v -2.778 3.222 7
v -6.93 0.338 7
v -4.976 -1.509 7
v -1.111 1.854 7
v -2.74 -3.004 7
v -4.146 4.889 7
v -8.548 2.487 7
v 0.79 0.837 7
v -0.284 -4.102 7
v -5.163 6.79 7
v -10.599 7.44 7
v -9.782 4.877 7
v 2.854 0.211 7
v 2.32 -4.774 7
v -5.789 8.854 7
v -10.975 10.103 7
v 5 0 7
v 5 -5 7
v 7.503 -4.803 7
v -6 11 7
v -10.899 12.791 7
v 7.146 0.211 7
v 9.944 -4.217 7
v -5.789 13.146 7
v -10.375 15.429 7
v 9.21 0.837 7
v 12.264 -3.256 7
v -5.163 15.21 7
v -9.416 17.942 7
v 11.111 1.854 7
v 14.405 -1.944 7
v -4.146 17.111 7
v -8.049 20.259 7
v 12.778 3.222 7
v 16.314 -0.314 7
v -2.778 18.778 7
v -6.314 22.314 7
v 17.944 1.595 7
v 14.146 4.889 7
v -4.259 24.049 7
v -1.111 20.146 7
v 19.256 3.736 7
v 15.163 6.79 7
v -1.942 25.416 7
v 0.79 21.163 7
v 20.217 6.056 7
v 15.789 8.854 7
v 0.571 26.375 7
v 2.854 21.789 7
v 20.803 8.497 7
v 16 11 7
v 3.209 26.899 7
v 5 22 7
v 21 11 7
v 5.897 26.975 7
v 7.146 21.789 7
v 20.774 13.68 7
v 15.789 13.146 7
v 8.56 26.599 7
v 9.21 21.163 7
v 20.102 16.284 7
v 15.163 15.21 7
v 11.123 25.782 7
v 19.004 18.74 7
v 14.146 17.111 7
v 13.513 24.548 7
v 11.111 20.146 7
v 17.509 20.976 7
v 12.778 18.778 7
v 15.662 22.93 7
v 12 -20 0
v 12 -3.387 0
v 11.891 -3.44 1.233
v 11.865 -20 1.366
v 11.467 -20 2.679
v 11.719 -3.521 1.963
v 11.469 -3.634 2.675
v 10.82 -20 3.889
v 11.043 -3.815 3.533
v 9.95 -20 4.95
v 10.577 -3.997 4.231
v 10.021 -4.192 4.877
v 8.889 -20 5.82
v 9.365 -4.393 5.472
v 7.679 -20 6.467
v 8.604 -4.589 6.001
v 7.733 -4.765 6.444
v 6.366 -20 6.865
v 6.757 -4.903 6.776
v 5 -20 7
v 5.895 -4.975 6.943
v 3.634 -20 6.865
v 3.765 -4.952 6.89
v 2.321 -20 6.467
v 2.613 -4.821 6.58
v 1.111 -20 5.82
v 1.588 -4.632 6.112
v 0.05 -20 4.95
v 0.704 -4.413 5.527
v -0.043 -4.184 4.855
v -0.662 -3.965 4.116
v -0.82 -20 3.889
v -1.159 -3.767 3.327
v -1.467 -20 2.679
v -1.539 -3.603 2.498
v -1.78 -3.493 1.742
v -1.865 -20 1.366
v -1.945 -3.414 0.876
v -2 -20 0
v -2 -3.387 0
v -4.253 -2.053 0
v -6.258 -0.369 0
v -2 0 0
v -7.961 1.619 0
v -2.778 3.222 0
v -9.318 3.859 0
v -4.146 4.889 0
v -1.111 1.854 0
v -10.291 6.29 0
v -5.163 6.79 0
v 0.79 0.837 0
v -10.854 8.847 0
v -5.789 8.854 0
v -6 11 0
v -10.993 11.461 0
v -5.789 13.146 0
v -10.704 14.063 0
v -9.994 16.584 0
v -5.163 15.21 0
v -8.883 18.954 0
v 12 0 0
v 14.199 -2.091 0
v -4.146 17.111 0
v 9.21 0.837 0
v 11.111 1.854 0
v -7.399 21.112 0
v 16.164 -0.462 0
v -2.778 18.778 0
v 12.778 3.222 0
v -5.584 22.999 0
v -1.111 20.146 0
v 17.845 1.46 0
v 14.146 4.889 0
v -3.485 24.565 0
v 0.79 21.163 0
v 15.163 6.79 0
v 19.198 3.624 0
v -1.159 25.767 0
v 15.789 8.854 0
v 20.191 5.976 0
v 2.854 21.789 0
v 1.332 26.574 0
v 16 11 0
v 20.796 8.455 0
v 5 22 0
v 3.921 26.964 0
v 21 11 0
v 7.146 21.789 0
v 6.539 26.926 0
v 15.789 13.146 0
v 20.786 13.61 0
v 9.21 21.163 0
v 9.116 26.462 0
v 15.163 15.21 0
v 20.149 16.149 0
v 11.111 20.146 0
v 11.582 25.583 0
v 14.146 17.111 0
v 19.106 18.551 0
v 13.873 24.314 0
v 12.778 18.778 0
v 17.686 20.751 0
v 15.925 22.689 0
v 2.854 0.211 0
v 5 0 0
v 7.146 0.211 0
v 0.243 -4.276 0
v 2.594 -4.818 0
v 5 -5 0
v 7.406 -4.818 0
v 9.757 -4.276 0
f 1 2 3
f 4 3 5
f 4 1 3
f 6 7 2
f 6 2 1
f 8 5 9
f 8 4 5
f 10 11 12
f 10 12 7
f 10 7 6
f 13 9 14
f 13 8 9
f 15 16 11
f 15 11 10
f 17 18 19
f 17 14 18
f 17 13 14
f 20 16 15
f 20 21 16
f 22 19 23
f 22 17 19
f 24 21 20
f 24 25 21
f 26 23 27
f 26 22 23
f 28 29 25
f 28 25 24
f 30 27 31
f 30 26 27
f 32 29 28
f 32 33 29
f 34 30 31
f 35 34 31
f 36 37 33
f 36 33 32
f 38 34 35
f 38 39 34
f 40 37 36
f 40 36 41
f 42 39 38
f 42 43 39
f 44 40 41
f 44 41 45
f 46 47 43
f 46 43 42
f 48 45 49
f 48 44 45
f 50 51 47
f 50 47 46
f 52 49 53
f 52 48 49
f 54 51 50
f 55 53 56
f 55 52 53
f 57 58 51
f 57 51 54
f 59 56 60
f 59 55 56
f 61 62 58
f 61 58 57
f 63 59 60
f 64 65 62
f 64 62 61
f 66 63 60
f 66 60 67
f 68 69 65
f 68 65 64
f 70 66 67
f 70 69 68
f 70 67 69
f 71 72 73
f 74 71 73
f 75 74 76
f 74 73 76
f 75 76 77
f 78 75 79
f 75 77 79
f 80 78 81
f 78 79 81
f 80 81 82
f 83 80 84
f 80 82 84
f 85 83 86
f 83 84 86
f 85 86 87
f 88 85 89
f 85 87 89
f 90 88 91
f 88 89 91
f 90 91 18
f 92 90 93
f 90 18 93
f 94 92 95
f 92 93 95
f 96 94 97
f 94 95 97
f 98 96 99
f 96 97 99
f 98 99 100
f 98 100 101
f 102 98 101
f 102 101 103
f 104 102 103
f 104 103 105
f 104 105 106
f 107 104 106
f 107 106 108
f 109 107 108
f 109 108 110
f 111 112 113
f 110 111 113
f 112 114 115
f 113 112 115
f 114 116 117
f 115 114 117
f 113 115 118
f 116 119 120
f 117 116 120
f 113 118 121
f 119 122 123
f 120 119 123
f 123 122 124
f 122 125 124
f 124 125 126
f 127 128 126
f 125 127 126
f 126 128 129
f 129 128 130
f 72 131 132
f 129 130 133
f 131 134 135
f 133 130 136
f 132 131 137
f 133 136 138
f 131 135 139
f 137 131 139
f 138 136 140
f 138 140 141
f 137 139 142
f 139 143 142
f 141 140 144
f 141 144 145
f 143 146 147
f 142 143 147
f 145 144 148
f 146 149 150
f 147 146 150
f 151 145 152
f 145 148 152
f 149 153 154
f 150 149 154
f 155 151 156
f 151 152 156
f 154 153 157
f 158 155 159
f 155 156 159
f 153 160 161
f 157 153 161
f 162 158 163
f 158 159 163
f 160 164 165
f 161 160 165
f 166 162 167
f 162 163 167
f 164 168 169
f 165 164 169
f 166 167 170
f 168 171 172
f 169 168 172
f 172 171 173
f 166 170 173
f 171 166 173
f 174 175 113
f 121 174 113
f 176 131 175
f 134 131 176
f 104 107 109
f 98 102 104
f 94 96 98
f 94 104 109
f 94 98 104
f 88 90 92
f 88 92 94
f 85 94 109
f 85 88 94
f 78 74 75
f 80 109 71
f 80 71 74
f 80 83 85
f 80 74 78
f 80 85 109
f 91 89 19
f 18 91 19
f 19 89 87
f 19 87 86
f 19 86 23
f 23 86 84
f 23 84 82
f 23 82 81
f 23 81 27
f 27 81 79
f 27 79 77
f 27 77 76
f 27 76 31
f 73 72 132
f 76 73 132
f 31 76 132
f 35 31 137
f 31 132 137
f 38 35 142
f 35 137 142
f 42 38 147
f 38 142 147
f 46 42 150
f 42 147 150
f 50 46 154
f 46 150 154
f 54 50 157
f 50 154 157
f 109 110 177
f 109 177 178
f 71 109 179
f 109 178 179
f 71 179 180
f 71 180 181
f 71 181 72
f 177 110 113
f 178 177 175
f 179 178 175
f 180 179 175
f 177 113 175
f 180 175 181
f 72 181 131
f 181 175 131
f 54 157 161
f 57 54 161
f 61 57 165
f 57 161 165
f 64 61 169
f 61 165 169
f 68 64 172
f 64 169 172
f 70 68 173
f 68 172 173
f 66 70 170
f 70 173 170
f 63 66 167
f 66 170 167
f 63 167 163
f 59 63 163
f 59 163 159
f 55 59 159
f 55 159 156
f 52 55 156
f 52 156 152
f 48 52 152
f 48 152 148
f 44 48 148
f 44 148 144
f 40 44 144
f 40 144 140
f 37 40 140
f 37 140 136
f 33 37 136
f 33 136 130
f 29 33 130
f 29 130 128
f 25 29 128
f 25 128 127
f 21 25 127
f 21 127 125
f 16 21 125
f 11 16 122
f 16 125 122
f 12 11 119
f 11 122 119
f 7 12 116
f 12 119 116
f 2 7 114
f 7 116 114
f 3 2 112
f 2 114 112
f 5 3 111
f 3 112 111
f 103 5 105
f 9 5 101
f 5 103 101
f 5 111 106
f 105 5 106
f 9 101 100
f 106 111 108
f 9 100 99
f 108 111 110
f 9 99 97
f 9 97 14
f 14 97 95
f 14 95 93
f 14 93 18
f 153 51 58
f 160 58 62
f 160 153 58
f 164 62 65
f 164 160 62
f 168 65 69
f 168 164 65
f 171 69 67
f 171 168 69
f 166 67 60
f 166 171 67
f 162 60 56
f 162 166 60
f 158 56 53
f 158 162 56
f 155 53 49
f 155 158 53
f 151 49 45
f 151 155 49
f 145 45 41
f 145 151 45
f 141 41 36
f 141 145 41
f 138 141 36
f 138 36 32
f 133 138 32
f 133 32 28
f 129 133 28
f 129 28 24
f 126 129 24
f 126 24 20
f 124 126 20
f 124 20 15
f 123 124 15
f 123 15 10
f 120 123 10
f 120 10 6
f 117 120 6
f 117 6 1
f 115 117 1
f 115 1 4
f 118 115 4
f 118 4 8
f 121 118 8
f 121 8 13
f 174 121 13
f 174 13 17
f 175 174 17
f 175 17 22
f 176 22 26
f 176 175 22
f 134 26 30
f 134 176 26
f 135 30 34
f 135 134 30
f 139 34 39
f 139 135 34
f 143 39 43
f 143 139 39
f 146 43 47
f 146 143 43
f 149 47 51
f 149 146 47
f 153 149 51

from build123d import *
from build123d import SkipClean  # not in build123d's __all__

# Parameters (mm, degrees)
F1_DEPTH = 20
F2_R     = 16
F2_R_2   = 11
F3_DEPTH = 7


with BuildPart() as f1:
    # F0 (on Front) → F1 (new body)
    with BuildSketch(Plane.XZ):
        with BuildLine():
            Line((-2, 0), (0, 0))
            Line((0, 0), (10, 0))
            Line((10, 0), (12, 0))
            ThreePointArc((12, 0), (5, 7), (-2, 0))
        make_face()
    extrude(amount=F1_DEPTH)

    # F2 (on Top) → F3 (join)
    with BuildSketch(Plane.XY):
        with Locations((5, 11)):
            Circle(F2_R)
        with Locations((5, 11)):
            Circle(F2_R_2, mode=Mode.SUBTRACT)
    with SkipClean():  # cleaning this boolean's faces spoils the solid; the shape is the same uncleaned
        extrude(amount=F3_DEPTH)


solid = f1.part
